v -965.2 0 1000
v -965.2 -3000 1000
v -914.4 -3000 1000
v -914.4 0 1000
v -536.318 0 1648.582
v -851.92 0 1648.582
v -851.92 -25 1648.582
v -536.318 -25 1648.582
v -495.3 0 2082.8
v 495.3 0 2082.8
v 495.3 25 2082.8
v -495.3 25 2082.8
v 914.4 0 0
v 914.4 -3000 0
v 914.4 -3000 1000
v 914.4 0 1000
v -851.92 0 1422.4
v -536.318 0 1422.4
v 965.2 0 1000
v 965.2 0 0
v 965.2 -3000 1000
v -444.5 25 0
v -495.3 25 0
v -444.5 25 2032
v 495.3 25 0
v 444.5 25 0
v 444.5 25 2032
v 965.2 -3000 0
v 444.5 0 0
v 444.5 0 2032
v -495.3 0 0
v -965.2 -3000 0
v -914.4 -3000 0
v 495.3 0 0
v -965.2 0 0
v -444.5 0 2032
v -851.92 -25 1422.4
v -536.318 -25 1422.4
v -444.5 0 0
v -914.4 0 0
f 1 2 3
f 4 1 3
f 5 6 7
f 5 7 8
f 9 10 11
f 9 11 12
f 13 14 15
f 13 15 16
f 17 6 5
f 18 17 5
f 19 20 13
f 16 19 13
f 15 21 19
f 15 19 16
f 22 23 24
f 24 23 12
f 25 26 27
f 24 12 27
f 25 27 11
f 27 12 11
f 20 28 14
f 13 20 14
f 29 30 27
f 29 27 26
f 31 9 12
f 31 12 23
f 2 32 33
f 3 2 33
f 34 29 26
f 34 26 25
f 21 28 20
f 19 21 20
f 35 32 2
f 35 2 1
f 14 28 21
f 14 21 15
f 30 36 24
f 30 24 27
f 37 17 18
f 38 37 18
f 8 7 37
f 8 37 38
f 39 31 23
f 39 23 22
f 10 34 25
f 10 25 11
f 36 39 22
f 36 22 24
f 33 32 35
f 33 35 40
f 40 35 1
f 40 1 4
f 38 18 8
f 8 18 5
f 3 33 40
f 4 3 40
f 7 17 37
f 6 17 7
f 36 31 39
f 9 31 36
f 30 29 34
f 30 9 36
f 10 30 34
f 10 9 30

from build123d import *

# Parameters (mm, degrees)
F0_W     = 50.8
F0_H     = 3000
F1_DEPTH = 1000
F4_DEPTH = 25
F5_W     = 315.602295
F5_H     = 226.181636
F6_DEPTH = 25


with BuildPart() as f1:
    # F0 (on Top) → F1 (new body)
    with BuildSketch(Plane.XY):
        with Locations((-939.8, -1500)):
            Rectangle(F0_W, F0_H)
    extrude(amount=F1_DEPTH)


with BuildPart() as f2_1:
    # F2: instance of F1
    add(f1.part.mirror(Plane.YZ))


with BuildPart() as f4:
    # F3 (on Front) → F4 (new body)
    with BuildSketch(Plane.XZ):
        Polygon((-444.5, 0), (-444.5, 2032), (444.5, 2032), (444.5, 0), (495.3, 0), (495.3, 2082.8), (-495.3, 2082.8), (-495.3, 0), align=None)
    extrude(amount=-F4_DEPTH)


with BuildPart() as f6:
    # F5 (on Front) → F6 (new body)
    with BuildSketch(Plane.XZ):
        with Locations((-694.119244, 1535.490818)):
            Rectangle(F5_W, F5_H)
    extrude(amount=F6_DEPTH)


solid = Compound([f1.part, f2_1.part, f4.part, f6.part])
